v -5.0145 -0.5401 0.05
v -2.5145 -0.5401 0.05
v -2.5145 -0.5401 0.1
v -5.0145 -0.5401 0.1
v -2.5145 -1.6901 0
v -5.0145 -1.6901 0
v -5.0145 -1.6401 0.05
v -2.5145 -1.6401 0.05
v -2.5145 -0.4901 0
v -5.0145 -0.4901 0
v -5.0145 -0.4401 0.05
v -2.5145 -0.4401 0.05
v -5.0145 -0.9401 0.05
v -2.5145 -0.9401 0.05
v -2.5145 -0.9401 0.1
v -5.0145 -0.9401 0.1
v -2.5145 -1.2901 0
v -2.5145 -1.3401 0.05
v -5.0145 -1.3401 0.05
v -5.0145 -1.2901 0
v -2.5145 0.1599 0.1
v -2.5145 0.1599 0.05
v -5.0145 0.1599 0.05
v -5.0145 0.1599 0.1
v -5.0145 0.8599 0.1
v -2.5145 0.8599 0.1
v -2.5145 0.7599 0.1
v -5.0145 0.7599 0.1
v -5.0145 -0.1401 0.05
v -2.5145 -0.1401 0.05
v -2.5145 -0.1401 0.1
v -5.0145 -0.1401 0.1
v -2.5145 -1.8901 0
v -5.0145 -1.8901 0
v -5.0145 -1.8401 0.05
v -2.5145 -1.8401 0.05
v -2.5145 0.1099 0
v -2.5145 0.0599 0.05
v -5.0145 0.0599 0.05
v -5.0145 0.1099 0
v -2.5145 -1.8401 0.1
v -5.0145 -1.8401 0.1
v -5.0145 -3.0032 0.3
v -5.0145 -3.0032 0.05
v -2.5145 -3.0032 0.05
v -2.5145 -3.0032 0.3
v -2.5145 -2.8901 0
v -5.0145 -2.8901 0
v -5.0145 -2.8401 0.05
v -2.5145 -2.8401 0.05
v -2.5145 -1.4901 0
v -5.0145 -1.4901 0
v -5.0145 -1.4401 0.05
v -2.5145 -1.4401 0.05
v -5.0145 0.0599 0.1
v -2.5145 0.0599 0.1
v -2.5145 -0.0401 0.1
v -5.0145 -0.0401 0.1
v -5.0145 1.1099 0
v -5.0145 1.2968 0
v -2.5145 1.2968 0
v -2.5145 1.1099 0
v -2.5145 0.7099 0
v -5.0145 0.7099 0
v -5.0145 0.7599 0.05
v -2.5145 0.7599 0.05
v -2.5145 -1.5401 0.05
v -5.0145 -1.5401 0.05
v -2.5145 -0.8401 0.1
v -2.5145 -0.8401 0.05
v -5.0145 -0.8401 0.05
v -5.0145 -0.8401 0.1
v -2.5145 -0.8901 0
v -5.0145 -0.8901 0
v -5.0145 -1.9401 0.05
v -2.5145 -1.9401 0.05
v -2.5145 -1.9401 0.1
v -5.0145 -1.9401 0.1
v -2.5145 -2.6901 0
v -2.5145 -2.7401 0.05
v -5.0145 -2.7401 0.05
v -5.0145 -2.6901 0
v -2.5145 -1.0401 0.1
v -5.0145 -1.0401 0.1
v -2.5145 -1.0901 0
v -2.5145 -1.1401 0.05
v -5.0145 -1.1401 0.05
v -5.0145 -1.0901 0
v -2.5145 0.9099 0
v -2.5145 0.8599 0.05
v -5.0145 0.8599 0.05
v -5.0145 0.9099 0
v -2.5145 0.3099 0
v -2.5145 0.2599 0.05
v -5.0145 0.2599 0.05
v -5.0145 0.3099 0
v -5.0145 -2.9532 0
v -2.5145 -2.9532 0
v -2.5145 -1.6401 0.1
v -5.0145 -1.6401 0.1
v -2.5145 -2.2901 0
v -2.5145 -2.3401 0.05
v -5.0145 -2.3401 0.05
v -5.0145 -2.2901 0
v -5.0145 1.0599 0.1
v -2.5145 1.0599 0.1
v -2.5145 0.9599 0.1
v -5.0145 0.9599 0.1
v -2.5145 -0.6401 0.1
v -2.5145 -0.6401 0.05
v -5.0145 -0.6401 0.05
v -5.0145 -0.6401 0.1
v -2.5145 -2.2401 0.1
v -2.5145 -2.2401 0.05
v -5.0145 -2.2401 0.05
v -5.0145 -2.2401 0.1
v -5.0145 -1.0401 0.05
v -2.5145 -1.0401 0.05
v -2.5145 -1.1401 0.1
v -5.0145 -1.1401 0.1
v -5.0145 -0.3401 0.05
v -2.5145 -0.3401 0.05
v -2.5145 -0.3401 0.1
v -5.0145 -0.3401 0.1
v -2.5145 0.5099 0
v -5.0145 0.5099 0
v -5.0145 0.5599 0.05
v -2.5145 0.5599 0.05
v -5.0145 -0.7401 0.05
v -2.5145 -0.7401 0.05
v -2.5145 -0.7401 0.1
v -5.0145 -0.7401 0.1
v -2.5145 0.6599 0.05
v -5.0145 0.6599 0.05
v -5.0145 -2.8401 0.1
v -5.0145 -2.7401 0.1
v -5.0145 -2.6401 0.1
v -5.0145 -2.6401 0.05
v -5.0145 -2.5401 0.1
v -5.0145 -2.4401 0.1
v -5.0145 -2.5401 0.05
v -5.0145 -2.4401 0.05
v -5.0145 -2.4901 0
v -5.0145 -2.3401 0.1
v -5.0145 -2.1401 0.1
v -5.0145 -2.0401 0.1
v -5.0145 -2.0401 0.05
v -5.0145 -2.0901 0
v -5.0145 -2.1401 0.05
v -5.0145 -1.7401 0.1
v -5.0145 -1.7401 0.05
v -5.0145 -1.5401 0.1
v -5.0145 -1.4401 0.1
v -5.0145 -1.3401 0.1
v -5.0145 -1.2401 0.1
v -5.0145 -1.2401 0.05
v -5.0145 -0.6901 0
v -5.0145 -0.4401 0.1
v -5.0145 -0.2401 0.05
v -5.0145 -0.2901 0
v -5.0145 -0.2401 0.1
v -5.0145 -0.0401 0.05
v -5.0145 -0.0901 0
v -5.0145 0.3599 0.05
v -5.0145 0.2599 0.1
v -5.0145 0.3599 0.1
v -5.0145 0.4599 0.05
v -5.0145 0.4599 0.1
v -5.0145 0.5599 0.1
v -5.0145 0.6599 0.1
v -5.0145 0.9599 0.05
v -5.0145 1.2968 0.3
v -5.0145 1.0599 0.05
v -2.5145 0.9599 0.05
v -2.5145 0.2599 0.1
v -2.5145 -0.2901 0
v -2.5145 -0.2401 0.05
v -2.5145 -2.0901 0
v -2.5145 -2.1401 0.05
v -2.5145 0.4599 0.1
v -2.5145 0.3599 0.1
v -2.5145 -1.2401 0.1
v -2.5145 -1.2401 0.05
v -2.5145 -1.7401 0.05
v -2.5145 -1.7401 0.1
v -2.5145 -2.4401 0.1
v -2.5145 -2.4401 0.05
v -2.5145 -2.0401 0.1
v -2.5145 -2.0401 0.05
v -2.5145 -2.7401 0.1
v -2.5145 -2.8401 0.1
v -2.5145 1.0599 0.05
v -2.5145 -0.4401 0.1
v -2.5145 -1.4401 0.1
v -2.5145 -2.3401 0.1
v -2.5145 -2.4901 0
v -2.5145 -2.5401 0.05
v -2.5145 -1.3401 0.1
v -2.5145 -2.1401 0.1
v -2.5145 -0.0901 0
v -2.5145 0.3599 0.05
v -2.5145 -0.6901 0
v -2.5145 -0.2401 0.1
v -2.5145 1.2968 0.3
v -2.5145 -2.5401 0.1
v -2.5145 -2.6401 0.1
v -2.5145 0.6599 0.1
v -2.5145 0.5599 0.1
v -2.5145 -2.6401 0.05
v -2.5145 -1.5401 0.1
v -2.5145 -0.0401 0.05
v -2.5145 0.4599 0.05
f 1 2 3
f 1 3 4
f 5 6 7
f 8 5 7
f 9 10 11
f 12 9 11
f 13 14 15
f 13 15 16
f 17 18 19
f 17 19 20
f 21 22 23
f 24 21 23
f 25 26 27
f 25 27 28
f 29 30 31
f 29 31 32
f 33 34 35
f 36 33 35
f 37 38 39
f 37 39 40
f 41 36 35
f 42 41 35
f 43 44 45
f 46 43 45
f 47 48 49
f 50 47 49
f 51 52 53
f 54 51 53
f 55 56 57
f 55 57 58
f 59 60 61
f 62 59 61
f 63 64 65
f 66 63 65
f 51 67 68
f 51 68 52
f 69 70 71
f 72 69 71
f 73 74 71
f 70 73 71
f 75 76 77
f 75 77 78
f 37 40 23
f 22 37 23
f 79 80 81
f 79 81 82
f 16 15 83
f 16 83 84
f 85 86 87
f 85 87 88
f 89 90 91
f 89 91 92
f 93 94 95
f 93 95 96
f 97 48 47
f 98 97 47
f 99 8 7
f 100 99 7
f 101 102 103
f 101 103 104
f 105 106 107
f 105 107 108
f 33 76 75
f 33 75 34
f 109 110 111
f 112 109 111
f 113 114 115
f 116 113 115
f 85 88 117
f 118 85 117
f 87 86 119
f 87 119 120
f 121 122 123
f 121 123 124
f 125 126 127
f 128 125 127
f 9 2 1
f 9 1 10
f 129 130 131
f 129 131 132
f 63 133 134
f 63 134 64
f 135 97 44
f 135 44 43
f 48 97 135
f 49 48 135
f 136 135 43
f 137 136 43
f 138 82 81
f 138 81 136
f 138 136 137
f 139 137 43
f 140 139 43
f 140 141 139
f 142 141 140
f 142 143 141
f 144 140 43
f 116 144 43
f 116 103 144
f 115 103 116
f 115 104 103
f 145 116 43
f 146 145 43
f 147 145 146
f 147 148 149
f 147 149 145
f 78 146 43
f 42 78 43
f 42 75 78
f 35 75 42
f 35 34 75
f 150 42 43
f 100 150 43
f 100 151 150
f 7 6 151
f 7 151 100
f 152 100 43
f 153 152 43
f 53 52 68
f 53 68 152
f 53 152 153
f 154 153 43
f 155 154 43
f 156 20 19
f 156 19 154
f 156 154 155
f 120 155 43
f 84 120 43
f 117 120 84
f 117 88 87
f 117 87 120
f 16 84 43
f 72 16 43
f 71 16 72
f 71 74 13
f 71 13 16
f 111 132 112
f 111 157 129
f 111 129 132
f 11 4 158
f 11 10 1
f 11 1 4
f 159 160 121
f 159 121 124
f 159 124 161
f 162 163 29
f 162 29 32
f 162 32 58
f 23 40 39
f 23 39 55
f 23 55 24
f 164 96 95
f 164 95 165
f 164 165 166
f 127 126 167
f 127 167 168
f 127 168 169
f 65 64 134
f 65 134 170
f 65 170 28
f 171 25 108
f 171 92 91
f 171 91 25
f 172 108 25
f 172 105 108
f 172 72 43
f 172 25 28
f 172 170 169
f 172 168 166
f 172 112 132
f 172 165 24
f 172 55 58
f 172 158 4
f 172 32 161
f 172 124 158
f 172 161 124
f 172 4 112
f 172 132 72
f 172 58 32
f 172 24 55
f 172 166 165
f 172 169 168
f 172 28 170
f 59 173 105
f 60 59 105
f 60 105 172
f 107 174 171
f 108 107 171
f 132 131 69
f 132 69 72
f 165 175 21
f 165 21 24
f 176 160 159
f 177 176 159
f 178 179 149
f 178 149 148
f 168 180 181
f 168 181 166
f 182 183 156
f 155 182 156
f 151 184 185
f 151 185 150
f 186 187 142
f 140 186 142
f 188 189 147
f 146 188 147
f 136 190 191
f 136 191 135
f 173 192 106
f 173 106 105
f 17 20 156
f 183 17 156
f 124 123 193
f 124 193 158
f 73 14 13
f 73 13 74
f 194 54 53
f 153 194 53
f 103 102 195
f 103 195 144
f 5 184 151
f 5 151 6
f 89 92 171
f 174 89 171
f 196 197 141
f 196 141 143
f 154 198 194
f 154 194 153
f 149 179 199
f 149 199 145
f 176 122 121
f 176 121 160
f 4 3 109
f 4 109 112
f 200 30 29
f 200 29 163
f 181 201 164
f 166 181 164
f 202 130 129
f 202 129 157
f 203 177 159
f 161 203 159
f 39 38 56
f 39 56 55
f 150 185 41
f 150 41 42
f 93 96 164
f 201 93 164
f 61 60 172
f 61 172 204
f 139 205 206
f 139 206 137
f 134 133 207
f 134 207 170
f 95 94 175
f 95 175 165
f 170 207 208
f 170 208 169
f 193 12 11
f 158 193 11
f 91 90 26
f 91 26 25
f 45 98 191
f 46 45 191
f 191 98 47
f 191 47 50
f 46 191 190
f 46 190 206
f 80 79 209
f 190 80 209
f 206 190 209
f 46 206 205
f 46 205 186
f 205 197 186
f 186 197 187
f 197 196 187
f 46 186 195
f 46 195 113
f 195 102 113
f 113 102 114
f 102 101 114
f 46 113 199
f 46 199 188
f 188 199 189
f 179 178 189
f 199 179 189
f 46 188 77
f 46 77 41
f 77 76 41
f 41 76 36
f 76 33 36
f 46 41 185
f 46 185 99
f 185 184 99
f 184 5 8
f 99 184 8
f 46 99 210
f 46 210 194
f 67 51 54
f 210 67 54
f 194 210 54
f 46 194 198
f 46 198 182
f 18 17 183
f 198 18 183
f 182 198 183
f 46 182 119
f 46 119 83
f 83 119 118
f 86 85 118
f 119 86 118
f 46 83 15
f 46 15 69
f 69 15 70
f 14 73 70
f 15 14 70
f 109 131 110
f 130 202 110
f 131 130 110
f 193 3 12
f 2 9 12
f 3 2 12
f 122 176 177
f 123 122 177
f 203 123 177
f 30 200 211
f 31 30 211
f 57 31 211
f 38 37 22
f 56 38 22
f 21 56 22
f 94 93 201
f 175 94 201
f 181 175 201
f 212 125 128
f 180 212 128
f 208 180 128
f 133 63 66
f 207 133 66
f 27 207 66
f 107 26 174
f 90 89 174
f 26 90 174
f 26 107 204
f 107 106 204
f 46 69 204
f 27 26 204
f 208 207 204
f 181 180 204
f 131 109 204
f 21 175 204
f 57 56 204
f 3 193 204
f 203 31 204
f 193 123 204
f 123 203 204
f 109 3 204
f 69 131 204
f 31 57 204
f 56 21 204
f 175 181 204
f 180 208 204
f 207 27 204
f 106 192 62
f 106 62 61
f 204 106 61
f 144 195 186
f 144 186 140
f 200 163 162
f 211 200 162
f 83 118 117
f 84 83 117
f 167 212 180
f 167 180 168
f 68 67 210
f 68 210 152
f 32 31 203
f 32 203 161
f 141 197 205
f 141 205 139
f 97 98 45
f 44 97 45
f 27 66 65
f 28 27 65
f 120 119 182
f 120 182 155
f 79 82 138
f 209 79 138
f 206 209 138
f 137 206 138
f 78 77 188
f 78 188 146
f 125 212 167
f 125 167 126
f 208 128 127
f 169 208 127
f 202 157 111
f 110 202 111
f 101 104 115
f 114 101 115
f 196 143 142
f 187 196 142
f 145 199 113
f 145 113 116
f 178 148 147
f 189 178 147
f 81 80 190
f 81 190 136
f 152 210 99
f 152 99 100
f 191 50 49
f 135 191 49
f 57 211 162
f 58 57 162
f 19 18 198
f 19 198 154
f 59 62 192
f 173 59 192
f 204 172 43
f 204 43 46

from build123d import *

# Parameters (mm, degrees)
ESBO_O1_W                = 2.5
ESBO_O1_H                = 4.3
RESSALTO_EXTRUS_O1_DEPTH = 0.3
ESBO_O2_W                = 2.5
ESBO_O2_H                = 0.1
CORTE_EXTRUS_O1_DEPTH    = 0.1
CHANFRO1_SIZE            = 0.05


with BuildPart() as part:
    # Esboço1 → Ressalto-extrusão1 (new body)
    with BuildSketch(Plane.XY):
        with Locations((-3.764526375, -0.853246753)):
            Rectangle(ESBO_O1_W, ESBO_O1_H)
    extrude(amount=RESSALTO_EXTRUS_O1_DEPTH)

    # Esboço2 → Corte-extrusão1 (cut)
    with BuildSketch(Plane(origin=(0, 0, 0), x_dir=(-1, 0, 0), z_dir=(0, 0, -1))):
        with Locations((3.764526375, 0.809857643)):
            Rectangle(ESBO_O2_W, ESBO_O2_H)
        with Locations((3.764526375, 1.009857643)):
            Rectangle(ESBO_O2_W, ESBO_O2_H)
        with Locations((3.764526375, 0.609857643)):
            Rectangle(ESBO_O2_W, ESBO_O2_H)
        with Locations((3.764526375, 0.409857643)):
            Rectangle(ESBO_O2_W, ESBO_O2_H)
        with Locations((3.764526375, 0.209857643)):
            Rectangle(ESBO_O2_W, ESBO_O2_H)
        with Locations((3.764526375, 0.009857643)):
            Rectangle(ESBO_O2_W, ESBO_O2_H)
        with Locations((3.764526375, -0.190142357)):
            Rectangle(ESBO_O2_W, ESBO_O2_H)
        with Locations((3.764526375, -0.390142357)):
            Rectangle(ESBO_O2_W, ESBO_O2_H)
        with Locations((3.764526375, -0.590142357)):
            Rectangle(ESBO_O2_W, ESBO_O2_H)
        with Locations((3.764526375, -0.790142357)):
            Rectangle(ESBO_O2_W, ESBO_O2_H)
        with Locations((3.764526375, -0.990142357)):
            Rectangle(ESBO_O2_W, ESBO_O2_H)
        with Locations((3.764526375, -1.190142357)):
            Rectangle(ESBO_O2_W, ESBO_O2_H)
        with Locations((3.764526375, -1.390142357)):
            Rectangle(ESBO_O2_W, ESBO_O2_H)
        with Locations((3.764526375, -1.590142357)):
            Rectangle(ESBO_O2_W, ESBO_O2_H)
        with Locations((3.764526375, -1.790142357)):
            Rectangle(ESBO_O2_W, ESBO_O2_H)
        with Locations((3.764526375, -1.990142357)):
            Rectangle(ESBO_O2_W, ESBO_O2_H)
        with Locations((3.764526375, -2.190142357)):
            Rectangle(ESBO_O2_W, ESBO_O2_H)
        with Locations((3.764526375, -2.390142357)):
            Rectangle(ESBO_O2_W, ESBO_O2_H)
        with Locations((3.764526375, -2.590142357)):
            Rectangle(ESBO_O2_W, ESBO_O2_H)
        with Locations((3.764526375, -2.790142357)):
            Rectangle(ESBO_O2_W, ESBO_O2_H)
    extrude(amount=-CORTE_EXTRUS_O1_DEPTH, mode=Mode.SUBTRACT)

    # Chanfro1
    # the kernel refuses this chamfer: 0.05 mm, written as the material it takes off along each edge
    with BuildSketch(Plane(origin=(-5.143110525, -0.240142357, 0), x_dir=(0, -0.9996219169112968, -0.027495876610586355), z_dir=(1, 0, 0)), Plane(origin=(-5.143110525, -0.440142357, 0), x_dir=(0, -0.9996219169112968, -0.027495876610586386), z_dir=(1, 0, 0)), Plane(origin=(-5.143110525, -0.640142357, 0), x_dir=(0, -0.9996219169112968, -0.027495876610586313), z_dir=(1, 0, 0)), Plane(origin=(-5.143110525, -0.840142357, 0), x_dir=(0, -0.9996219169112968, -0.027495876610586313), z_dir=(1, 0, 0)), Plane(origin=(-5.143110525, -1.040142357, 0), x_dir=(0, -0.9996219169112968, -0.027495876610586313), z_dir=(1, 0, 0)), Plane(origin=(-5.143110525, -1.240142357, 0), x_dir=(0, -0.9996219169112968, -0.027495876610586313), z_dir=(1, 0, 0)), Plane(origin=(-5.143110525, -1.440142357, 0), x_dir=(0, -0.9996219169112968, -0.027495876610586313), z_dir=(1, 0, 0)), Plane(origin=(-5.143110525, -1.640142357, 0), x_dir=(0, -0.9996219169112968, -0.027495876610586313), z_dir=(1, 0, 0)), Plane(origin=(-5.143110525, 0.959857643, 0), x_dir=(0, -0.9996219169112968, -0.027495876610586344), z_dir=(1, 0, 0)), Plane(origin=(-2.385942226, 1.059857643, 0), x_dir=(0, 0.9996219169112968, -0.027495876610586313), z_dir=(-1, 0, 0)), Plane(origin=(-5.143110525, -1.840142357, 0), x_dir=(0, -0.9996219169112968, -0.027495876610586313), z_dir=(1, 0, 0)), Plane(origin=(-5.143110525, -2.040142357, 0), x_dir=(0, -0.9996219169112966, -0.027495876610586487), z_dir=(1, 0, 0)), Plane(origin=(-5.143110525, -2.240142357, 0), x_dir=(0, -0.9996219169112966, -0.027495876610586487), z_dir=(1, 0, 0)), Plane(origin=(-5.143110525, -2.440142357, 0), x_dir=(0, -0.9996219169112966, -0.027495876610586487), z_dir=(1, 0, 0)), Plane(origin=(-5.143110525, -2.640142357, 0), x_dir=(0, -0.9996219169112966, -0.027495876610586487), z_dir=(1, 0, 0)), Plane(origin=(-5.143110525, -2.840142357, 0), x_dir=(0, -0.9996219169112966, -0.027495876610586487), z_dir=(1, 0, 0)), Plane(origin=(-5.143110525, 0.759857643, 0), x_dir=(0, -0.9996219169112968, -0.02749587661058628), z_dir=(1, 0, 0)), Plane(origin=(-5.143110525, 0.559857643, 0), x_dir=(0, -0.9996219169112968, -0.027495876610586313), z_dir=(1, 0, 0)), Plane(origin=(-2.385942226, -3.003246753, 0), x_dir=(0, 0.9996219169112966, -0.027495876610586487), z_dir=(-1, 0, 0)), Plane(origin=(-5.143110525, 0.359857643, 0), x_dir=(0, -0.9996219169112968, -0.027495876610586355), z_dir=(1, 0, 0)), Plane(origin=(-5.143110525, 0.159857643, 0), x_dir=(0, -0.9996219169112968, -0.027495876610586303), z_dir=(1, 0, 0)), Plane(origin=(-5.143110525, -0.040142357, 0), x_dir=(0, -0.9996219169112968, -0.02749587661058635), z_dir=(1, 0, 0))) as chanfro1_piece_1:
        Polygon((CHANFRO1_SIZE * 0.999621916911, -CHANFRO1_SIZE * 0.0274958766106), (-CHANFRO1_SIZE * 0.0274958766106, -CHANFRO1_SIZE * 0.999621916911), (0, 0), align=None)
    extrude(amount=2.757168299, mode=Mode.SUBTRACT)
    with BuildSketch(Plane(origin=(-2.385942226, -0.140142357, 0), x_dir=(0, -0.027495876610586275, 0.9996219169112968), z_dir=(-1, 0, 0)), Plane(origin=(-2.385942226, -0.340142357, 0), x_dir=(0, -0.027495876610586275, 0.9996219169112968), z_dir=(-1, 0, 0)), Plane(origin=(-2.385942226, -0.540142357, 0), x_dir=(0, -0.02749587661058735, 0.9996219169112966), z_dir=(-1, 0, 0)), Plane(origin=(-2.385942226, -0.740142357, 0), x_dir=(0, -0.02749587661058735, 0.9996219169112966), z_dir=(-1, 0, 0)), Plane(origin=(-2.385942226, -0.940142357, 0), x_dir=(0, -0.02749587661058735, 0.9996219169112966), z_dir=(-1, 0, 0)), Plane(origin=(-2.385942226, -1.140142357, 0), x_dir=(0, -0.02749587661058735, 0.9996219169112966), z_dir=(-1, 0, 0)), Plane(origin=(-2.385942226, -1.340142357, 0), x_dir=(0, -0.02749587661058735, 0.9996219169112966), z_dir=(-1, 0, 0)), Plane(origin=(-2.385942226, -1.540142357, 0), x_dir=(0, -0.02749587661058735, 0.9996219169112966), z_dir=(-1, 0, 0)), Plane(origin=(-2.385942226, -1.740142357, 0), x_dir=(0, -0.02749587661058735, 0.9996219169112966), z_dir=(-1, 0, 0)), Plane(origin=(-2.385942226, -1.940142357, 0), x_dir=(0, -0.02749587661058735, 0.9996219169112966), z_dir=(-1, 0, 0)), Plane(origin=(-2.385942226, -2.140142357, 0), x_dir=(0, -0.02749587661058735, 0.9996219169112966), z_dir=(-1, 0, 0)), Plane(origin=(-2.385942226, -2.340142357, 0), x_dir=(0, -0.02749587661058735, 0.9996219169112966), z_dir=(-1, 0, 0)), Plane(origin=(-2.385942226, -2.540142357, 0), x_dir=(0, -0.02749587661058735, 0.9996219169112966), z_dir=(-1, 0, 0)), Plane(origin=(-2.385942226, -2.740142357, 0), x_dir=(0, -0.02749587661058735, 0.9996219169112966), z_dir=(-1, 0, 0)), Plane(origin=(-2.385942226, 0.859857643, 0), x_dir=(0, -0.02749587661058735, 0.9996219169112966), z_dir=(-1, 0, 0)), Plane(origin=(-2.385942226, 0.659857643, 0), x_dir=(0, -0.027495876610587354, 0.9996219169112966), z_dir=(-1, 0, 0)), Plane(origin=(-2.385942226, 0.459857643, 0), x_dir=(0, -0.027495876610586275, 0.9996219169112968), z_dir=(-1, 0, 0)), Plane(origin=(-2.385942226, 0.259857643, 0), x_dir=(0, -0.027495876610586275, 0.9996219169112968), z_dir=(-1, 0, 0)), Plane(origin=(-2.385942226, 0.059857643, 0), x_dir=(0, -0.027495876610586407, 0.9996219169112968), z_dir=(-1, 0, 0))) as chanfro1_piece_2:
        Polygon((CHANFRO1_SIZE * 0.999621916911, CHANFRO1_SIZE * 0.0274958766106), (-CHANFRO1_SIZE * 0.0274958766106, CHANFRO1_SIZE * 0.999621916911), (0, 0), align=None)
    extrude(amount=2.757168299, mode=Mode.SUBTRACT)


solid = part.part
